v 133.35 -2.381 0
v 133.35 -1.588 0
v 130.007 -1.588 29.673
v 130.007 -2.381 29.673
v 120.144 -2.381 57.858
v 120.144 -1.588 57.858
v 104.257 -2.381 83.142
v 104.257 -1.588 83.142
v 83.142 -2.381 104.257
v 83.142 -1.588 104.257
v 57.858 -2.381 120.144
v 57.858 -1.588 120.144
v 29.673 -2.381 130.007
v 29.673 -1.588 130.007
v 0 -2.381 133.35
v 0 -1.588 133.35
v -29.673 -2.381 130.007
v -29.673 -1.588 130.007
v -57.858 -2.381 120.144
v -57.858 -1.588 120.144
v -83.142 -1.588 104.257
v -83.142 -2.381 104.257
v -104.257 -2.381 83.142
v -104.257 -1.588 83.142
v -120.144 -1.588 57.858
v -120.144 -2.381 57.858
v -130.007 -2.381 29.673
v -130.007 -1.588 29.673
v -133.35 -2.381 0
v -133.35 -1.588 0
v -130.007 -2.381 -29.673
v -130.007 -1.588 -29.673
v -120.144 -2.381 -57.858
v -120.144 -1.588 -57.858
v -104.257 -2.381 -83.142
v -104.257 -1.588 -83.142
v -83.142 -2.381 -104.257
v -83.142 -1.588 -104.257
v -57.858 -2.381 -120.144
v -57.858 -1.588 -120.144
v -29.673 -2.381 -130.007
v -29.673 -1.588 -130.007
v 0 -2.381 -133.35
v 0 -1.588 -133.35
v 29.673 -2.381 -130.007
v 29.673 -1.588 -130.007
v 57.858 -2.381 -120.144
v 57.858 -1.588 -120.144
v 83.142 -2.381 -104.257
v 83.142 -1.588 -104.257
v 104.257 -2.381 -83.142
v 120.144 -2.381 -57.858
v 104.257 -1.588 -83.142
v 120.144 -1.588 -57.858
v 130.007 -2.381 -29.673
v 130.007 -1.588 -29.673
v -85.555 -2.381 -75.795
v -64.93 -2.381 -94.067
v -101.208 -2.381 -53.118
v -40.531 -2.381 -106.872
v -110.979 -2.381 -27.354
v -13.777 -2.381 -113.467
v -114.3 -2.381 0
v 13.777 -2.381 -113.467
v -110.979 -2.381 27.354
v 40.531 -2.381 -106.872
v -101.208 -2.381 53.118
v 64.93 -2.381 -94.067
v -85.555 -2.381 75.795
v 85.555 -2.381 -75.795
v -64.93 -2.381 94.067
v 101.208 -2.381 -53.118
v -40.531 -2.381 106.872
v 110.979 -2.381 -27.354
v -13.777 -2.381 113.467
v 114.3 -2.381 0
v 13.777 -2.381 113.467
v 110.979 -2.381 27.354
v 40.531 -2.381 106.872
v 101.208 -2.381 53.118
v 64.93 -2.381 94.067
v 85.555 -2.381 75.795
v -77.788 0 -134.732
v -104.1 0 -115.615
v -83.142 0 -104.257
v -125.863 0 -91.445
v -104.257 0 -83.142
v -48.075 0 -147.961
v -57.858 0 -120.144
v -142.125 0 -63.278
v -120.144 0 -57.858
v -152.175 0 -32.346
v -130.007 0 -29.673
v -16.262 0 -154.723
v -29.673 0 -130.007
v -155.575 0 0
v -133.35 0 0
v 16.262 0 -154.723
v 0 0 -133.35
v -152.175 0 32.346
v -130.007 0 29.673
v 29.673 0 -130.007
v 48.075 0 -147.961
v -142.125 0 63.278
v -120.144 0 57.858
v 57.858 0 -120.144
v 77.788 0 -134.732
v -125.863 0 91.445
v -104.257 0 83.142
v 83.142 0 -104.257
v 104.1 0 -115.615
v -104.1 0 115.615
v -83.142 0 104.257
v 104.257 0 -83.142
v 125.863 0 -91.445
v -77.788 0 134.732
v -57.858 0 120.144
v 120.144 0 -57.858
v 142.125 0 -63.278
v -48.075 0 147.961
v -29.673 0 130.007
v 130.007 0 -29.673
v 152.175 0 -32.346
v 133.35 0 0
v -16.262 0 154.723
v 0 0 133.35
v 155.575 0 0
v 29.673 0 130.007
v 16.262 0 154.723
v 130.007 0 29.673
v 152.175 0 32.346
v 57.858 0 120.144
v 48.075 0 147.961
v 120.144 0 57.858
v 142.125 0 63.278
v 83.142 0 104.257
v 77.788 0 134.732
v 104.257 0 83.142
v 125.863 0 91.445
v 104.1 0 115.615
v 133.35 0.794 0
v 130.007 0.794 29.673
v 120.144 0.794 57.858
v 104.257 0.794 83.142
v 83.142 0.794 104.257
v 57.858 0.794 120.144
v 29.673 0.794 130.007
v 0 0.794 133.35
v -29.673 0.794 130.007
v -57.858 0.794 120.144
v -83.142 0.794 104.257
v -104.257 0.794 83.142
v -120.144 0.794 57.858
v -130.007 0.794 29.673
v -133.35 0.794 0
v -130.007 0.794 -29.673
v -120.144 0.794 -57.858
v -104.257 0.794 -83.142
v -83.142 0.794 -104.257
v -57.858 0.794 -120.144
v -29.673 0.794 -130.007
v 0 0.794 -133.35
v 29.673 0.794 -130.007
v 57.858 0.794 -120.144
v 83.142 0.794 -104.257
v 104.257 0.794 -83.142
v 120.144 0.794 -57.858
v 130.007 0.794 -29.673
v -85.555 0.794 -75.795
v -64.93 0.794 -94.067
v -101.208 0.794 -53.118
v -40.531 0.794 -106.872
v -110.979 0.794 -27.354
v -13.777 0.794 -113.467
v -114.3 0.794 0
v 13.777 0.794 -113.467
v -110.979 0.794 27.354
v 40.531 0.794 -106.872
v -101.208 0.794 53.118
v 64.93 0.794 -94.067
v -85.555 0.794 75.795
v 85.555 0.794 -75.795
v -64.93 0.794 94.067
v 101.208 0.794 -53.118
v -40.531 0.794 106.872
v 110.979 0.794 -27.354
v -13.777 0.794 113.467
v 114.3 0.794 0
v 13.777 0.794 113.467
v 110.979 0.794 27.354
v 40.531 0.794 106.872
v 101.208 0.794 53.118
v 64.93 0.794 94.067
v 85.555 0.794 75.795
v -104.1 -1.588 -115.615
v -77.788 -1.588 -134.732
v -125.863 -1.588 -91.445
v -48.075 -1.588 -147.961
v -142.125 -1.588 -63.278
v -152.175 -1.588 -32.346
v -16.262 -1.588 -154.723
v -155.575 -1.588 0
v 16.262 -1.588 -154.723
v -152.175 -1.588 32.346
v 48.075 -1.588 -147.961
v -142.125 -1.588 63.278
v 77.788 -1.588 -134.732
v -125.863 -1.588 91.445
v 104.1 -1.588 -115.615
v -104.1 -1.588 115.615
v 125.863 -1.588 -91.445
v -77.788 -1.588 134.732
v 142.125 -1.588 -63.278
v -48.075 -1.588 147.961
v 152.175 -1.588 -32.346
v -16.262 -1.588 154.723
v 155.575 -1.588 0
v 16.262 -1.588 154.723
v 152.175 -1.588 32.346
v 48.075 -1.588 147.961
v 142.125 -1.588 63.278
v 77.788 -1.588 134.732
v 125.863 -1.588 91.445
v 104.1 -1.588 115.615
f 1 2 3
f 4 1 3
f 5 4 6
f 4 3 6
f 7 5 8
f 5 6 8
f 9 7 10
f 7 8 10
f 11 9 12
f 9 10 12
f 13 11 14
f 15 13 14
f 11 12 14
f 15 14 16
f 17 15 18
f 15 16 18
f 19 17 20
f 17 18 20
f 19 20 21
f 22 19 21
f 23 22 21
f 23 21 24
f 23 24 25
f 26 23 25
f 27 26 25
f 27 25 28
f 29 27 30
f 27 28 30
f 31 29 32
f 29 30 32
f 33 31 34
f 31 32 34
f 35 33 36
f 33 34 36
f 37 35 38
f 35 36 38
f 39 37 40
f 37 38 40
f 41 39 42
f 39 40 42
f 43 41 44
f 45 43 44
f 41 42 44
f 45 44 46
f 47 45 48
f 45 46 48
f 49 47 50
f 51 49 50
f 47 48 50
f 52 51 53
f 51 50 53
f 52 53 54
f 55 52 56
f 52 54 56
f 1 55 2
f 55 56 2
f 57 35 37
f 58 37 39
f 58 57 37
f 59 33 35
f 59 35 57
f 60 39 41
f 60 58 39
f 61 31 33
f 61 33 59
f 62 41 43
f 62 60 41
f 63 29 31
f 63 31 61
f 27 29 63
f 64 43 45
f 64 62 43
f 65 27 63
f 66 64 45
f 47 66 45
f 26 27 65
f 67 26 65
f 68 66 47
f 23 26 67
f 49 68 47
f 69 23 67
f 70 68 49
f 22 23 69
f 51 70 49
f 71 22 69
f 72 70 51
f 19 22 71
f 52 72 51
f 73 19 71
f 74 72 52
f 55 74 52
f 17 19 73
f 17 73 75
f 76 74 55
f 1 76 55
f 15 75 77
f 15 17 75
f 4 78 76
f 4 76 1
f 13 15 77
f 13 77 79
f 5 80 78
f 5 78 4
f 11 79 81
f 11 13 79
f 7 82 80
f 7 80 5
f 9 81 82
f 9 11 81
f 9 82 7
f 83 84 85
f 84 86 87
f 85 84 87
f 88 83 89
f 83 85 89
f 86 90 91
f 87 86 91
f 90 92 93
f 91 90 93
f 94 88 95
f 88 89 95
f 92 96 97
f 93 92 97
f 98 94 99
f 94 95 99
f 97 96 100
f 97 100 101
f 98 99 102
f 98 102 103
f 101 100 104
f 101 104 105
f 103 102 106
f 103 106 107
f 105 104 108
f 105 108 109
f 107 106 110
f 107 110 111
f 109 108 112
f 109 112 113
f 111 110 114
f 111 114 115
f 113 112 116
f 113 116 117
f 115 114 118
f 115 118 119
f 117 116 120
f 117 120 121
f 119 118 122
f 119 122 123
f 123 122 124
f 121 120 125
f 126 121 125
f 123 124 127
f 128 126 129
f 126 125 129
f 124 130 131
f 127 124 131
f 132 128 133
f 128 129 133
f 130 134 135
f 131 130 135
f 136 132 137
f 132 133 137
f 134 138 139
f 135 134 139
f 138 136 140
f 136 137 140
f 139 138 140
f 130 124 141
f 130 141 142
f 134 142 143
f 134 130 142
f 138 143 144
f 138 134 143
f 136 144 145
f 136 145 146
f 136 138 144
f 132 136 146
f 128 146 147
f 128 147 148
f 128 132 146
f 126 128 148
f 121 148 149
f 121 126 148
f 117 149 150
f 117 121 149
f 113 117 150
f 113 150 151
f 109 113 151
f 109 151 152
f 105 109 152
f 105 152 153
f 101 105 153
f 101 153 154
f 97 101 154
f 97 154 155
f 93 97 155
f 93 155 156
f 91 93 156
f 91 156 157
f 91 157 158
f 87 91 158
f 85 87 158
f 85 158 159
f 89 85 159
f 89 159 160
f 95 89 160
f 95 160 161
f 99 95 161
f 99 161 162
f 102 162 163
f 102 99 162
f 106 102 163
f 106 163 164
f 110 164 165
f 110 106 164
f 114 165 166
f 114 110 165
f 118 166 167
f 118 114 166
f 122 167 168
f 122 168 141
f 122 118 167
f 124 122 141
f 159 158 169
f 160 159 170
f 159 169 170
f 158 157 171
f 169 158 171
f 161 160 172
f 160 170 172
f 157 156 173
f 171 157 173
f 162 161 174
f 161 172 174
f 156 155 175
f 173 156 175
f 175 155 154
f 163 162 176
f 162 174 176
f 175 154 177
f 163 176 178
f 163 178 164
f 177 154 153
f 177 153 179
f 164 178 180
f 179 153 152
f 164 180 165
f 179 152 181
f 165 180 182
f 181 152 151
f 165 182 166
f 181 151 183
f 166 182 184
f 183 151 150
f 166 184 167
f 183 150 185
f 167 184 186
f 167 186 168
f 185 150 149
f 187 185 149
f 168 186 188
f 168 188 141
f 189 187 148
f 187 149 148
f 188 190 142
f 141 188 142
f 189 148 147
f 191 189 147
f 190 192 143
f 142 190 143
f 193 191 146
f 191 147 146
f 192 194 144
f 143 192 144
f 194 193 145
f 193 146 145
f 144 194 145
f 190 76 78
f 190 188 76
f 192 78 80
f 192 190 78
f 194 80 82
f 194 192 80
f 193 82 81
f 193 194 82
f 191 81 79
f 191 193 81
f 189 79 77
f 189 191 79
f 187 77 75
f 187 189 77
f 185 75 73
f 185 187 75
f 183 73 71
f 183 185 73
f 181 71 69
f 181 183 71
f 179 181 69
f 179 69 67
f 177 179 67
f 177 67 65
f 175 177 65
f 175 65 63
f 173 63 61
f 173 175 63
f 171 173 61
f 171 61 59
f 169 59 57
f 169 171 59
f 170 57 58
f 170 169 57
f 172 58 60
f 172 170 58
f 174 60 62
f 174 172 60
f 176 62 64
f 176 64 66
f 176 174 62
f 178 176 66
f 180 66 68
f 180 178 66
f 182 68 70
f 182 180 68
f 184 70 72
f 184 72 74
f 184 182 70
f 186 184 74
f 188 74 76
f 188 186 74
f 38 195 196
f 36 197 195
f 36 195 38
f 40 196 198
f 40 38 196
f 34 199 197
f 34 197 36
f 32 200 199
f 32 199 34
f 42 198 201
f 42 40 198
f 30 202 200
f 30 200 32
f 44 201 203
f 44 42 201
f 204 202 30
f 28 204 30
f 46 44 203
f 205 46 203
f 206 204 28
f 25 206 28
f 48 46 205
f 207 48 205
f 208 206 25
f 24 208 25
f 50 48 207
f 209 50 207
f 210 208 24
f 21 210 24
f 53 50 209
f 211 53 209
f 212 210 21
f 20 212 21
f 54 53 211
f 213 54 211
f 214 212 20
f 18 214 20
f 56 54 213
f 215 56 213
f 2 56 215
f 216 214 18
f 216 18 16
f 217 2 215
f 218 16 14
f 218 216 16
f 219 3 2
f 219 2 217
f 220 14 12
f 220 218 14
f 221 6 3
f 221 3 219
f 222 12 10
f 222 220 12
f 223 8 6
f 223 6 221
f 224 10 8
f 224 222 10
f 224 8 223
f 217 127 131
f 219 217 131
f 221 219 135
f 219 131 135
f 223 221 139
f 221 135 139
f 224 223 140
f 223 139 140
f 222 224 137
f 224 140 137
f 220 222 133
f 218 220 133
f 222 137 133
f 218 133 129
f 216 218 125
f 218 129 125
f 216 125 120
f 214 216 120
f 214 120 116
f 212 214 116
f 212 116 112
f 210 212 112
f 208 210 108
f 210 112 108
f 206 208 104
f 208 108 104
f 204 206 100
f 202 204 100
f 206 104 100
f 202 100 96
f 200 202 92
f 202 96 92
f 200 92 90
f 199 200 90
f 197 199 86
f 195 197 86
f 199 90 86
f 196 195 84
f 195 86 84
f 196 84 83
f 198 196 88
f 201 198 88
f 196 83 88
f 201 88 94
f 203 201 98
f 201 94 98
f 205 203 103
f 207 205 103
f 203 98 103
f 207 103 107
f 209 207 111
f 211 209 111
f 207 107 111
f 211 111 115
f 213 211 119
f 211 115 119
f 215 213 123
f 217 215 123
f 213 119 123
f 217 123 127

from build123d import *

# Parameters (mm, degrees)
F0_R     = 155.575
F0_R_2   = 114.3
F1_DEPTH = 1.5875
F4_R     = 133.35
F4_R_2   = 114.3
F5_DEPTH = 1.5875
F6_R     = 133.35
F6_R_2   = 114.3
F7_DEPTH = 0.79375


with BuildPart() as f1:
    # F0 (on Front) → F1 (new body)
    with BuildSketch(Plane.XZ):
        Circle(F0_R)
        Circle(F0_R_2, mode=Mode.SUBTRACT)
    extrude(amount=F1_DEPTH)

    # F4 (on offset) → F5 (join)
    with BuildSketch(Plane.XZ.offset(0.79375)):
        Circle(F4_R)
        Circle(F4_R_2, mode=Mode.SUBTRACT)
    extrude(amount=-F5_DEPTH)

    # F6 (on offset) → F7 (join)
    with BuildSketch(Plane.XZ.offset(1.5875)):
        Circle(F6_R)
        Circle(F6_R_2, mode=Mode.SUBTRACT)
    extrude(amount=F7_DEPTH)


solid = f1.part
